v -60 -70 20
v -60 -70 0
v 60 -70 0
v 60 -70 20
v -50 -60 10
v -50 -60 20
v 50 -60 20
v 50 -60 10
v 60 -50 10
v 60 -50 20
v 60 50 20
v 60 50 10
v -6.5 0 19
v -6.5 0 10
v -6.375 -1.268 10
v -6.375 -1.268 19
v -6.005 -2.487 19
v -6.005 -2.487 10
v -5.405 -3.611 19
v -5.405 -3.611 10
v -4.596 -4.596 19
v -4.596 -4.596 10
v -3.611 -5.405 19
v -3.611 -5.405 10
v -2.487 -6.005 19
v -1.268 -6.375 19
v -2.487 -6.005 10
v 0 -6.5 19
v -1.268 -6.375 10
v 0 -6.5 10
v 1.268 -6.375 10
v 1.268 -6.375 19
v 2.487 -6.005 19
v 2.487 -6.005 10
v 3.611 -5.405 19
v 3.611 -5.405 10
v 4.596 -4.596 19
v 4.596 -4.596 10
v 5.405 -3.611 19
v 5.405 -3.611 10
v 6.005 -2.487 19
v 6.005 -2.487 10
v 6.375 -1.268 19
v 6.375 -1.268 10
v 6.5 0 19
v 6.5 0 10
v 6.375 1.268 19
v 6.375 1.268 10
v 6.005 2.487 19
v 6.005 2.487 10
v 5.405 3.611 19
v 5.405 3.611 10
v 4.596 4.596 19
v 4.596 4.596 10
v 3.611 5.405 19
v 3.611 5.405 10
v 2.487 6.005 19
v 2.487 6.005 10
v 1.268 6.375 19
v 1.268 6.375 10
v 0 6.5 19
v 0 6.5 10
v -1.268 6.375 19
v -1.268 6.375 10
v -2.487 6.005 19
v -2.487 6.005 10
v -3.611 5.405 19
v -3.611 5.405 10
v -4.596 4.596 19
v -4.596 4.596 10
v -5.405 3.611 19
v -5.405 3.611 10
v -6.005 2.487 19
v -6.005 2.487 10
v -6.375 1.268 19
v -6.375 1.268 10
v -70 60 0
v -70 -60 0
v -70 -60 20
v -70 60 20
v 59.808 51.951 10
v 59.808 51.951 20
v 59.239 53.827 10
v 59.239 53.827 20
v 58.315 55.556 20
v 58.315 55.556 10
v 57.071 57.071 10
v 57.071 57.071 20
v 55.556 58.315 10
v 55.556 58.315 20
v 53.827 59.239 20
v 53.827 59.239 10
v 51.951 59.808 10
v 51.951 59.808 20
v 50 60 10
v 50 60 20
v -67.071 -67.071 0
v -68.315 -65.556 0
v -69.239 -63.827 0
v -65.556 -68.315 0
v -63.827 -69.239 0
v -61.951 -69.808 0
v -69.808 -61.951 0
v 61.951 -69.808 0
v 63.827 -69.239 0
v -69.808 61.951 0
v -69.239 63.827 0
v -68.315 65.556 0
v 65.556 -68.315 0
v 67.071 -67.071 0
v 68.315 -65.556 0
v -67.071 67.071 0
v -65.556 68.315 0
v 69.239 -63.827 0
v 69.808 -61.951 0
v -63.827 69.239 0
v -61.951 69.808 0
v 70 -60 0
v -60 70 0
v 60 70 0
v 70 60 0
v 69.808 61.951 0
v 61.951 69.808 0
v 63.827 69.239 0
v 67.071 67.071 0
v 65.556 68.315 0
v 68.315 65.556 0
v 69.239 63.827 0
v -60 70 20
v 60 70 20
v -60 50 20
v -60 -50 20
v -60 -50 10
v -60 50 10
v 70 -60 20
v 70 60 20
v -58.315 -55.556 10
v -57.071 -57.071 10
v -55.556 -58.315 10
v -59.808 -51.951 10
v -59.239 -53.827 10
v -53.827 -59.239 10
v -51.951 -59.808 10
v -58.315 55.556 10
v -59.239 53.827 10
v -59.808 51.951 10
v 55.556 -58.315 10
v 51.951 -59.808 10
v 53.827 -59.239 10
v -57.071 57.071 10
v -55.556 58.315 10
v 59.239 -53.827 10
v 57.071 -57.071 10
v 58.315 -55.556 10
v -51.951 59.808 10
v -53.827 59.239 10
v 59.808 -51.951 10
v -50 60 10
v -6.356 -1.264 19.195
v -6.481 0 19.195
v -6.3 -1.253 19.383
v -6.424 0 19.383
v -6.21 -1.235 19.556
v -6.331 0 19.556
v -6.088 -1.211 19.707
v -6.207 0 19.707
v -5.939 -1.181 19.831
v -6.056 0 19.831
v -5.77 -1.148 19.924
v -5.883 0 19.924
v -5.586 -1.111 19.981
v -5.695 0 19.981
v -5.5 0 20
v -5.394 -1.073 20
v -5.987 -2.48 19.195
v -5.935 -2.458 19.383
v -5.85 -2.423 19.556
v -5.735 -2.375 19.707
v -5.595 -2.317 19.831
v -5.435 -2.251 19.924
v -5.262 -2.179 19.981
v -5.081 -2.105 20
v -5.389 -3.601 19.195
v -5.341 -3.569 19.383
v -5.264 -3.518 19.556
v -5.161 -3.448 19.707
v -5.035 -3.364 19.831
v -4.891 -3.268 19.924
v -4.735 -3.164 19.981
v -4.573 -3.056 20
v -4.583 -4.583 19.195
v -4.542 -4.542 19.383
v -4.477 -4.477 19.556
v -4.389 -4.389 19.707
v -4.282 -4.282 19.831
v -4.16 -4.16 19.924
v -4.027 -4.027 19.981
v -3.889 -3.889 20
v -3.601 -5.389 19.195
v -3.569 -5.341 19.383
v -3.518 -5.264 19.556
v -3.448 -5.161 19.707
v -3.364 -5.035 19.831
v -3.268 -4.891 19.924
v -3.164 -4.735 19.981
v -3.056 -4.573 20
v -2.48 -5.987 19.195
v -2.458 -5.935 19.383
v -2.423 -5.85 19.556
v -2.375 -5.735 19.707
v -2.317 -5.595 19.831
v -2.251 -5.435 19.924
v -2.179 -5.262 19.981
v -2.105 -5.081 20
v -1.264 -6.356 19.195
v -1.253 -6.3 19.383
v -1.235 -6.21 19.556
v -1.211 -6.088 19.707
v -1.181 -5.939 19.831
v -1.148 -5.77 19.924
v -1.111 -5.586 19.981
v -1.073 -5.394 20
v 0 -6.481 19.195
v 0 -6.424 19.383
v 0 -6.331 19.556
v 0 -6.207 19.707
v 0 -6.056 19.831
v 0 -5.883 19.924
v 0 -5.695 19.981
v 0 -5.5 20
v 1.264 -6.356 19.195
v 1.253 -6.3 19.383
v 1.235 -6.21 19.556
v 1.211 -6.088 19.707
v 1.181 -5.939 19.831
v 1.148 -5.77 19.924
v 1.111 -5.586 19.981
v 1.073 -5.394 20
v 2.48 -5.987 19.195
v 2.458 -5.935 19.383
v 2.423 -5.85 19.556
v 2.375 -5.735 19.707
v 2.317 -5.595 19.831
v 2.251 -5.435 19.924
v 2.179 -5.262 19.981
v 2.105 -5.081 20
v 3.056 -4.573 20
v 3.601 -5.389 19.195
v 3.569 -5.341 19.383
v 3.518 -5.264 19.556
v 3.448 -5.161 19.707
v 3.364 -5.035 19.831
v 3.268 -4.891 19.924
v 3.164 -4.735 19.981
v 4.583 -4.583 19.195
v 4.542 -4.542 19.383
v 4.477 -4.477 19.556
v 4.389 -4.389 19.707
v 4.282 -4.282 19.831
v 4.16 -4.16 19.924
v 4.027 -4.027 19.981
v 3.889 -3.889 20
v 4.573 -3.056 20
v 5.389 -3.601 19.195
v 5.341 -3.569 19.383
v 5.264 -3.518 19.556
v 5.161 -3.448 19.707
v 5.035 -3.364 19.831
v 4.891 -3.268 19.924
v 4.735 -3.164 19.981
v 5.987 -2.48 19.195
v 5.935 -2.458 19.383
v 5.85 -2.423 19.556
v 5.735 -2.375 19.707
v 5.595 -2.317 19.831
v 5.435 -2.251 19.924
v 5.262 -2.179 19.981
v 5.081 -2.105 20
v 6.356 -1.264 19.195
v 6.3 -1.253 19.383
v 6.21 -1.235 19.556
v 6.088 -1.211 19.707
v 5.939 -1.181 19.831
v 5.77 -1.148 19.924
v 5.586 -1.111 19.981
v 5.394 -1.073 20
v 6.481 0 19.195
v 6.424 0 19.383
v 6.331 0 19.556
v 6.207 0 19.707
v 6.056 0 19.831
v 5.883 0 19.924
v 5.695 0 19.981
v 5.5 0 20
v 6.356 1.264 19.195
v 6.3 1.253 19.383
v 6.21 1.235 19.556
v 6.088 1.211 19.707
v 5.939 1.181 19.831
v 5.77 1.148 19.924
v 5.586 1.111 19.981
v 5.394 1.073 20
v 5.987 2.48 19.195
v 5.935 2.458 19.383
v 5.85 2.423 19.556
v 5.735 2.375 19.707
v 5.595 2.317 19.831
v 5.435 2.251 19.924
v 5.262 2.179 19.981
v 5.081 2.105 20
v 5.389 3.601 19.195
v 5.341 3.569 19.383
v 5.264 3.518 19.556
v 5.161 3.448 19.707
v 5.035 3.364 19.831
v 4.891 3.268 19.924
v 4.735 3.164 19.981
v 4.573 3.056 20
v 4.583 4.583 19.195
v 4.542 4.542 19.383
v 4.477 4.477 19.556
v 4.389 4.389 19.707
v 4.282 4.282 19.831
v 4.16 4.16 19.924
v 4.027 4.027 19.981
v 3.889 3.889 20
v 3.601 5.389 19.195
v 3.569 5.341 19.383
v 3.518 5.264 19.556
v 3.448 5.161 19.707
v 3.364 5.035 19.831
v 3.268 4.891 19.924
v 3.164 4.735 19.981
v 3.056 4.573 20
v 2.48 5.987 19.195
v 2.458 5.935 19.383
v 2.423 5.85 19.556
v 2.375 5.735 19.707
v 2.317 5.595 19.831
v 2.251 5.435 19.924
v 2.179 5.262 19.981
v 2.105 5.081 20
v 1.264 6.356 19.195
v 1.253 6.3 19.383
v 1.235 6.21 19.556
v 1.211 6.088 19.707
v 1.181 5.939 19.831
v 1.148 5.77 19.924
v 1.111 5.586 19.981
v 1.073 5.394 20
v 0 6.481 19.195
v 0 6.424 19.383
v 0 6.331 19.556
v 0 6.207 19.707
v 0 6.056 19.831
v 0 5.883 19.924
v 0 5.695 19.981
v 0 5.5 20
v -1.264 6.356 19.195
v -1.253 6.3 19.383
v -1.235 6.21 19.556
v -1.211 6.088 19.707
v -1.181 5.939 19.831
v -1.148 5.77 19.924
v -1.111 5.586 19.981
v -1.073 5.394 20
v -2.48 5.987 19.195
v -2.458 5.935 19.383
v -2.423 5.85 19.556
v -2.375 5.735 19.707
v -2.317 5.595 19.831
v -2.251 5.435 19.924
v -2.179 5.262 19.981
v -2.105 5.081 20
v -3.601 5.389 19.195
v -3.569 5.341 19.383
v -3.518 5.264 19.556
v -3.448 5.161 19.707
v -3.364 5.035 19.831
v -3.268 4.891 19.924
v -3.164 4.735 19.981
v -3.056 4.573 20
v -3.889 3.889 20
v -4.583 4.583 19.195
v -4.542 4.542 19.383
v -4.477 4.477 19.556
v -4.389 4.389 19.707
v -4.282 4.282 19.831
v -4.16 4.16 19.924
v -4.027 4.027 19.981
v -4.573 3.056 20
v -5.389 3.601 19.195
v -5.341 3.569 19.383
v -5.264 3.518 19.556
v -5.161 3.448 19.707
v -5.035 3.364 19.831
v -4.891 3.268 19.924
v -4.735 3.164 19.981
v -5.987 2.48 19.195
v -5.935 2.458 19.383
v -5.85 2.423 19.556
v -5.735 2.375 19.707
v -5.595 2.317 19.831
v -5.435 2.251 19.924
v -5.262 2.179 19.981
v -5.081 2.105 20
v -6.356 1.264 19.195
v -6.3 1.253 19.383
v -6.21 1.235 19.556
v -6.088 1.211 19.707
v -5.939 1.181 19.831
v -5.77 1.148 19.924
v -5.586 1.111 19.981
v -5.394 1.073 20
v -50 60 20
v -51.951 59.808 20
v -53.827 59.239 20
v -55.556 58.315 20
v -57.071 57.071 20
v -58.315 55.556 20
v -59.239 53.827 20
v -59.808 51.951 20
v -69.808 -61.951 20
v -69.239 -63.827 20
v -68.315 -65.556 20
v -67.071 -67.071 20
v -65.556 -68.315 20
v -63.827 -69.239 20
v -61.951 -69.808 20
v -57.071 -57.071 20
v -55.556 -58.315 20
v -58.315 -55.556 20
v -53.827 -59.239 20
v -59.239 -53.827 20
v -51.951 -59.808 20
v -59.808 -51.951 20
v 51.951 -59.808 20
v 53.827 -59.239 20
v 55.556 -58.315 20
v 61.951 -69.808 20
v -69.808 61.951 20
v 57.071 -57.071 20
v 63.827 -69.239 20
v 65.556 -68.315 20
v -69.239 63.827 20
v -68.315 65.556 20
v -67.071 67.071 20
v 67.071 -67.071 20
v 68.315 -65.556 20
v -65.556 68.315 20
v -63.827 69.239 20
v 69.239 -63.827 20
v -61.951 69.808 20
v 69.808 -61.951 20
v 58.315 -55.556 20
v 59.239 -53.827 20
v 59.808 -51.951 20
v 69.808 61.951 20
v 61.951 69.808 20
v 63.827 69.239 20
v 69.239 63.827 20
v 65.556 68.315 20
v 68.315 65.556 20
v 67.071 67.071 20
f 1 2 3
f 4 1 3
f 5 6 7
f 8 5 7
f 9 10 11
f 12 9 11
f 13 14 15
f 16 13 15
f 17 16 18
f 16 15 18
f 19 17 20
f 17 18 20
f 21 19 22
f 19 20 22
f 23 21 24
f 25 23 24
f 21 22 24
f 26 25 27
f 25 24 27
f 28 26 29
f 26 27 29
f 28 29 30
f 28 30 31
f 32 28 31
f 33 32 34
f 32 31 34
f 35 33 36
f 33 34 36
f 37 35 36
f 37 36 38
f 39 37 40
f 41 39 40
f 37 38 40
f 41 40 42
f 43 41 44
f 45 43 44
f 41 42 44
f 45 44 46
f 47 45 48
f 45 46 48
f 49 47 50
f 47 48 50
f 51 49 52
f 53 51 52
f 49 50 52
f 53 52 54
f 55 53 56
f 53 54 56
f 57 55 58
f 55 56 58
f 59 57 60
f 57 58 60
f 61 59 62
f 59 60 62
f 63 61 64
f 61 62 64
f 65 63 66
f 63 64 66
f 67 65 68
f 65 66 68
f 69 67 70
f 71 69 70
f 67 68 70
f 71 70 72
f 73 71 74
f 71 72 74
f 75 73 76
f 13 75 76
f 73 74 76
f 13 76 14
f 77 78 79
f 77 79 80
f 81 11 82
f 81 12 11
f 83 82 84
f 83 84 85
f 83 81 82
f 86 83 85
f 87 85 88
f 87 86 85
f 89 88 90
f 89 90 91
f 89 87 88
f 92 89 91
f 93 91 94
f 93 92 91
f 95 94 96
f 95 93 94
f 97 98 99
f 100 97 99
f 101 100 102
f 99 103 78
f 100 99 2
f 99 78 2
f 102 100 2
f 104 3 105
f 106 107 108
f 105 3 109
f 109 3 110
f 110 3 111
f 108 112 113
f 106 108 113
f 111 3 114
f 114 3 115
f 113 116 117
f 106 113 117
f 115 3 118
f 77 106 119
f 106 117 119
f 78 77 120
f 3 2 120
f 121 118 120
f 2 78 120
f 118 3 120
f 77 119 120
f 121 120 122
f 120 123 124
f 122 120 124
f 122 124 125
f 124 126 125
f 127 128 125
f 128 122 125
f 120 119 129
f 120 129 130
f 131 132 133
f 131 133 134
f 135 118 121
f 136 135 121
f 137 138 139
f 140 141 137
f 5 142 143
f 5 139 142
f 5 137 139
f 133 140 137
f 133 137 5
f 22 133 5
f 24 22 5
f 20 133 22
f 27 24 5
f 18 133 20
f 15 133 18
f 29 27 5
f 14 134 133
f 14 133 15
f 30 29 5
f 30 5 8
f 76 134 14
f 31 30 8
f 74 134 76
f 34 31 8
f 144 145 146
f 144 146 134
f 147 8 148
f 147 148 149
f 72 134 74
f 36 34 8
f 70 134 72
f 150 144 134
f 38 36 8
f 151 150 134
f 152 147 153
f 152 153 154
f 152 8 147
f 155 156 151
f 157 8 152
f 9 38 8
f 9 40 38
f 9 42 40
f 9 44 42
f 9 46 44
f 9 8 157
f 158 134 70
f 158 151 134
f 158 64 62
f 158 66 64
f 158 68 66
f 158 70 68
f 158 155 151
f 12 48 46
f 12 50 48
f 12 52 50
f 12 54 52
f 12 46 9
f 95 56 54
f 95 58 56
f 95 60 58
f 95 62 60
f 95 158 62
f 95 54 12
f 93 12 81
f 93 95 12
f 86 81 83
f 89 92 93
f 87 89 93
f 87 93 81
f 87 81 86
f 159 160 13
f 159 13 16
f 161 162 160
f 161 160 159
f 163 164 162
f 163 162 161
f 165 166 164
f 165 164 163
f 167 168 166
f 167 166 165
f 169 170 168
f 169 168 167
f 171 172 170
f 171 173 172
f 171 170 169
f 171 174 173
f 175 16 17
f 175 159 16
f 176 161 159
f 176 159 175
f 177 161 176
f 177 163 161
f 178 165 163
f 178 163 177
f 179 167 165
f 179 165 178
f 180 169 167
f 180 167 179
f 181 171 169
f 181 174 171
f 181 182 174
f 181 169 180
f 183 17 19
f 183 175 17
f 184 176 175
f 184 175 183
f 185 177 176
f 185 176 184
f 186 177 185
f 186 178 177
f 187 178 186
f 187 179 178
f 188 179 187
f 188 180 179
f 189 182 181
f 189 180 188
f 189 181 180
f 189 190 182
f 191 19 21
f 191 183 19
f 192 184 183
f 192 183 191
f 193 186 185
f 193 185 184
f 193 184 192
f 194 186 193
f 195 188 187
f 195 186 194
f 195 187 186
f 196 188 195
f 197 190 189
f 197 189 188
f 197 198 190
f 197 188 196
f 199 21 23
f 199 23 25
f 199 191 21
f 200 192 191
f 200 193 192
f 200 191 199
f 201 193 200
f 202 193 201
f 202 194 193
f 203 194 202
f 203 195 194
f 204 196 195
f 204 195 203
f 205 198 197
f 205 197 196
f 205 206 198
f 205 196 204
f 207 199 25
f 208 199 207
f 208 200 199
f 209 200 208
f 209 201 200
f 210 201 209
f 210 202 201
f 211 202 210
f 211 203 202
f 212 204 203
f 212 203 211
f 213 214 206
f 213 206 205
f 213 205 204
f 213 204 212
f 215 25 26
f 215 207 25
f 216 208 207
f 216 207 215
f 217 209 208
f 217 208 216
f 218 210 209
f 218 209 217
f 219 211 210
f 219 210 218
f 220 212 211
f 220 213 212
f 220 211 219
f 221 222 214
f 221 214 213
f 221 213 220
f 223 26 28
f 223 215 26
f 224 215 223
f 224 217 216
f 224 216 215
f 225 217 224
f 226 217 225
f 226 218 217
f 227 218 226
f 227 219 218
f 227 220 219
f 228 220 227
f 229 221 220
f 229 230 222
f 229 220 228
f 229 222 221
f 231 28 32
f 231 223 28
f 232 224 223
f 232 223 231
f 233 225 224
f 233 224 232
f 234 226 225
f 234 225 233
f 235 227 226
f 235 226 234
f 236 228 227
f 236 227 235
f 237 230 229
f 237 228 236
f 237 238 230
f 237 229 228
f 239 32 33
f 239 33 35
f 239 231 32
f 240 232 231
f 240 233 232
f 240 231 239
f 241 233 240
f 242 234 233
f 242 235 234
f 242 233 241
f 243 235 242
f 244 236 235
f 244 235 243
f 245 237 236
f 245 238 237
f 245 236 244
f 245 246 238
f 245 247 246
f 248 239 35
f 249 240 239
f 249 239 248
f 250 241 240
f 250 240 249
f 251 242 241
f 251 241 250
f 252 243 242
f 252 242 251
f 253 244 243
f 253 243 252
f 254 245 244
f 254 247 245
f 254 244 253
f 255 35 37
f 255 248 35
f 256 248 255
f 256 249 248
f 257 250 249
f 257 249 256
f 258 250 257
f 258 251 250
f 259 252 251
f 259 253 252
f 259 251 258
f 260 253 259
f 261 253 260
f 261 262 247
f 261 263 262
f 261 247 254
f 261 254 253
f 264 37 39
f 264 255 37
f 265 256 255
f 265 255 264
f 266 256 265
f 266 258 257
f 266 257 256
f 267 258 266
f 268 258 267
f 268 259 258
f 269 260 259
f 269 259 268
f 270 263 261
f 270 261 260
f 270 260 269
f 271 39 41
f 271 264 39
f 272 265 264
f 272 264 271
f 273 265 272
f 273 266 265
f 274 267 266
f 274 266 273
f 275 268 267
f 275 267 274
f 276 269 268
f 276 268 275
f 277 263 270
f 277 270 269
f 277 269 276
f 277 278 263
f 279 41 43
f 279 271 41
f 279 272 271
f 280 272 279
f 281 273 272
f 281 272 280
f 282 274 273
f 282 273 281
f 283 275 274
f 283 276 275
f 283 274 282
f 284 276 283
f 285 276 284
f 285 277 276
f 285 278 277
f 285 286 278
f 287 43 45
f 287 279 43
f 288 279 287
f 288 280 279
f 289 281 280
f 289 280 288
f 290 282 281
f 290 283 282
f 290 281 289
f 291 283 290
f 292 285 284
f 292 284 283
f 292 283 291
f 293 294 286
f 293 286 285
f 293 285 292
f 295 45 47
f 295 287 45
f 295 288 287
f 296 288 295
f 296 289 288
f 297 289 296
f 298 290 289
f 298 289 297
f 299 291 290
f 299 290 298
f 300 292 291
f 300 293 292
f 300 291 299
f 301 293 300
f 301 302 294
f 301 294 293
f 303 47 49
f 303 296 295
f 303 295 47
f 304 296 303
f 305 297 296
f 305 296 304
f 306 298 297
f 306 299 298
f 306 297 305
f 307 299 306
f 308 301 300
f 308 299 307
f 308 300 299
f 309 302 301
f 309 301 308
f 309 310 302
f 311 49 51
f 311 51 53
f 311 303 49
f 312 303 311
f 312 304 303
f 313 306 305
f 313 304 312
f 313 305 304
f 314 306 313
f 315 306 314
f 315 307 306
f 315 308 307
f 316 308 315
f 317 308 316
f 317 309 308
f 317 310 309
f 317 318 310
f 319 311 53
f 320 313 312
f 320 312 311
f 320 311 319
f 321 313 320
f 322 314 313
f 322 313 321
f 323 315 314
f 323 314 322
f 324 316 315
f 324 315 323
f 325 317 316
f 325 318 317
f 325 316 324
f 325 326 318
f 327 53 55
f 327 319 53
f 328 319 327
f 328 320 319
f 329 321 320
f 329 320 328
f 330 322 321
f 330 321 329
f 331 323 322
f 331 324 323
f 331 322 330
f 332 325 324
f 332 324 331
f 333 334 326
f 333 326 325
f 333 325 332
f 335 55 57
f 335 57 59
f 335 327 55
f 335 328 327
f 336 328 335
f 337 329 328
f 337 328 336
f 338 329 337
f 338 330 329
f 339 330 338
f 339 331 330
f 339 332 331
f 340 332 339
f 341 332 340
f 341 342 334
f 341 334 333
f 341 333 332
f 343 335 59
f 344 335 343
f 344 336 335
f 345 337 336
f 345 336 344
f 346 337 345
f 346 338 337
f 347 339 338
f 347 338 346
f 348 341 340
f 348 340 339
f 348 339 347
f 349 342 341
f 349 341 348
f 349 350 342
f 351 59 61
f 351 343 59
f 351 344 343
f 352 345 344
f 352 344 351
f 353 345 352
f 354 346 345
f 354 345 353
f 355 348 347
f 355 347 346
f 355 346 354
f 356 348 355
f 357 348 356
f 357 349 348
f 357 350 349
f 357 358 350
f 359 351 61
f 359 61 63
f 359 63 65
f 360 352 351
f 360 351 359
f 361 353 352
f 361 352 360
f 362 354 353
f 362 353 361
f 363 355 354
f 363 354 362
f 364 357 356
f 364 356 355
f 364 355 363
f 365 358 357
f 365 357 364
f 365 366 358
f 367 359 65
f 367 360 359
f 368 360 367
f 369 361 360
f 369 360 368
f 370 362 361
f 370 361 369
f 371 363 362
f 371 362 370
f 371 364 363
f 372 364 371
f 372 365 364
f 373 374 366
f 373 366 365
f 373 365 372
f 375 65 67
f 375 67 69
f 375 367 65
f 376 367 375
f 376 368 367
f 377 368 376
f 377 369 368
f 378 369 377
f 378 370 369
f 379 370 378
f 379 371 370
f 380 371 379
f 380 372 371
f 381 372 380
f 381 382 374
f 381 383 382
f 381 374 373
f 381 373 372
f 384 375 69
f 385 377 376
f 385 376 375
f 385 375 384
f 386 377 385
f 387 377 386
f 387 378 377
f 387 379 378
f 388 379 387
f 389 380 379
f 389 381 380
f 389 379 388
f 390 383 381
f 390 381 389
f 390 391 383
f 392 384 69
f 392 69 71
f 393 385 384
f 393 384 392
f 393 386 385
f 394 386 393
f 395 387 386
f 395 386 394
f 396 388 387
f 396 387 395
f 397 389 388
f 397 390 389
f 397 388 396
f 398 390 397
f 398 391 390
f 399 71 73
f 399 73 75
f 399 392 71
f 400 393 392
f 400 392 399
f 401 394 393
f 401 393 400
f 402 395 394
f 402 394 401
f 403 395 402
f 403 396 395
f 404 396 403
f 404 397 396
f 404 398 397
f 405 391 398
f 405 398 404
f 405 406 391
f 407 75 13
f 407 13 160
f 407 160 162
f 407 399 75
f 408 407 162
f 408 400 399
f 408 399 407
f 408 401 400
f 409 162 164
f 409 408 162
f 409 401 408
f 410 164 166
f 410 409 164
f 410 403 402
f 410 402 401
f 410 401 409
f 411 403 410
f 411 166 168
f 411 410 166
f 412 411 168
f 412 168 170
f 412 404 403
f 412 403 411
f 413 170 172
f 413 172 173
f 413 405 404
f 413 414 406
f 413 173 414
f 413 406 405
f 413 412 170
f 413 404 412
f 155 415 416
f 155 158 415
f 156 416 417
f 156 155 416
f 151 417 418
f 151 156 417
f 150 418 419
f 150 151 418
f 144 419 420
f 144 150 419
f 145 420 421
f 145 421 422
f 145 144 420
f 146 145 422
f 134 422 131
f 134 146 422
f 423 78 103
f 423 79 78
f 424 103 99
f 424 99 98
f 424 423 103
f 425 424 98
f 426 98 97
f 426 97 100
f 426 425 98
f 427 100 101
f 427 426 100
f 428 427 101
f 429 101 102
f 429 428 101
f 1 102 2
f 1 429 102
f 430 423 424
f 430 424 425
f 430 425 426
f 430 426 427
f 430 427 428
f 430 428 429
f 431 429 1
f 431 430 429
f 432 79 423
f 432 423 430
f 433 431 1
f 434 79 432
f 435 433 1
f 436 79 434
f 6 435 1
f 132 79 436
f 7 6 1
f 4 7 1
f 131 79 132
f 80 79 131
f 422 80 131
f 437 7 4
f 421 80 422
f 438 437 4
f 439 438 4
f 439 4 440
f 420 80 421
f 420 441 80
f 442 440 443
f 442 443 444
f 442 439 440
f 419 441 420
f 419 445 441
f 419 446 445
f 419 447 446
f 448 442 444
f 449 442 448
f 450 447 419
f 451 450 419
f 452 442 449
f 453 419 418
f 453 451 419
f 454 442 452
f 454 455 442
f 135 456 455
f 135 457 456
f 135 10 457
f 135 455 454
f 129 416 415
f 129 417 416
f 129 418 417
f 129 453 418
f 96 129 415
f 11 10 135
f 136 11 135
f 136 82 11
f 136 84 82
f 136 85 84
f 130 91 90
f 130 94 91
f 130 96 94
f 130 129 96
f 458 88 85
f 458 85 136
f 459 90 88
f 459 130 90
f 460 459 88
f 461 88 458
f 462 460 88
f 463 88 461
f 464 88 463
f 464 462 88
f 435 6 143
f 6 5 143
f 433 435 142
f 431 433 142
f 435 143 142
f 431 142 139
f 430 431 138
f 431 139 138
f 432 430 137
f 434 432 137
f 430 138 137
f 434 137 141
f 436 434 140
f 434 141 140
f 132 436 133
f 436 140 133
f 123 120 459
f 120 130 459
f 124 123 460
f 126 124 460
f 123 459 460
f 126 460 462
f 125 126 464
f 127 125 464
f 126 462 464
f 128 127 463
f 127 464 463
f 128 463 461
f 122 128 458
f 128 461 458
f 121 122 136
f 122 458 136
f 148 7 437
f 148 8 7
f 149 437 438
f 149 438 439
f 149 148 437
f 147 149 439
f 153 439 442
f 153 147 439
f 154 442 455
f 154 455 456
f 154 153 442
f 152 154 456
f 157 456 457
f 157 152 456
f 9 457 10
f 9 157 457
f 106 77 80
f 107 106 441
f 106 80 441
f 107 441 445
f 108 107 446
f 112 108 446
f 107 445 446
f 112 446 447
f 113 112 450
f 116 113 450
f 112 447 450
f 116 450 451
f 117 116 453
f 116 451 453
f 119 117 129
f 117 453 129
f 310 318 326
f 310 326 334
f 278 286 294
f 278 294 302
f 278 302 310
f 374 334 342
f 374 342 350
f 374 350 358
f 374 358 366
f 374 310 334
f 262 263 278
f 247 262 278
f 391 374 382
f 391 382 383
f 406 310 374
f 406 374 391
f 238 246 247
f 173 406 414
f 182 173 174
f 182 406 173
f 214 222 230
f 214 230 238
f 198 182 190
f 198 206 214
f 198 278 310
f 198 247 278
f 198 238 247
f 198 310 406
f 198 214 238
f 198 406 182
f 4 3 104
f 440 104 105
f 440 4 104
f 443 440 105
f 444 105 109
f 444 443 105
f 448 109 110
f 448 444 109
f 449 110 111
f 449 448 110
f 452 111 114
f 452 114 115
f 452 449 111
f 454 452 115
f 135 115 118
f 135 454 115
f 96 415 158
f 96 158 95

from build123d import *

# Parameters (mm, degrees)
ESQUISSE1_W             = 140
ESQUISSE1_H             = 140
BOSS_EXTRU_1_DEPTH      = 20
ESQUISSE2_W             = 120
ESQUISSE2_H             = 120
ENL_V_MAT_EXTRU_1_DEPTH = 10
CONG_1_R                = 10
CONG_2_R                = 10
ESQUISSE3_R             = 6.5
BOSS_EXTRU_2_DEPTH      = 10
CONG_3_R                = 1


with BuildPart() as part:
    # Esquisse1 → Boss.-Extru.1 (new body)
    with BuildSketch(Plane.XY):
        Rectangle(ESQUISSE1_W, ESQUISSE1_H)
    extrude(amount=BOSS_EXTRU_1_DEPTH)

    # Esquisse2 → Enlèv. mat.-Extru.1 (cut)
    with BuildSketch(Plane.XY.offset(20)):
        Rectangle(ESQUISSE2_W, ESQUISSE2_H)
    extrude(amount=-ENL_V_MAT_EXTRU_1_DEPTH, mode=Mode.SUBTRACT)

    # Congé1
    cong_1_edges = [part.edges().sort_by_distance(p)[0] for p in [
        (60, 60, 15),
        (60, -60, 15),
        (-60, -60, 15),
        (-60, 60, 15),
    ]]
    fillet(cong_1_edges, radius=CONG_1_R)

    # Congé2
    cong_2_edges = [part.edges().sort_by_distance(p)[0] for p in [
        (70, -70, 10),
        (-70, -70, 10),
        (-70, 70, 10),
        (70, 70, 10),
    ]]
    fillet(cong_2_edges, radius=CONG_2_R)

    # Esquisse3 → Boss.-Extru.2 (add)
    with BuildSketch(Plane.XY.offset(10)):
        with Locations(Location((0, 0, 0), (0, 0, 180))):
            Circle(ESQUISSE3_R)
    extrude(amount=BOSS_EXTRU_2_DEPTH)

    # Congé3
    cong_3_edges = [part.edges().sort_by_distance(p)[0] for p in [
        (6.5, 0, 20),
    ]]
    fillet(cong_3_edges, radius=CONG_3_R)


solid = part.part
